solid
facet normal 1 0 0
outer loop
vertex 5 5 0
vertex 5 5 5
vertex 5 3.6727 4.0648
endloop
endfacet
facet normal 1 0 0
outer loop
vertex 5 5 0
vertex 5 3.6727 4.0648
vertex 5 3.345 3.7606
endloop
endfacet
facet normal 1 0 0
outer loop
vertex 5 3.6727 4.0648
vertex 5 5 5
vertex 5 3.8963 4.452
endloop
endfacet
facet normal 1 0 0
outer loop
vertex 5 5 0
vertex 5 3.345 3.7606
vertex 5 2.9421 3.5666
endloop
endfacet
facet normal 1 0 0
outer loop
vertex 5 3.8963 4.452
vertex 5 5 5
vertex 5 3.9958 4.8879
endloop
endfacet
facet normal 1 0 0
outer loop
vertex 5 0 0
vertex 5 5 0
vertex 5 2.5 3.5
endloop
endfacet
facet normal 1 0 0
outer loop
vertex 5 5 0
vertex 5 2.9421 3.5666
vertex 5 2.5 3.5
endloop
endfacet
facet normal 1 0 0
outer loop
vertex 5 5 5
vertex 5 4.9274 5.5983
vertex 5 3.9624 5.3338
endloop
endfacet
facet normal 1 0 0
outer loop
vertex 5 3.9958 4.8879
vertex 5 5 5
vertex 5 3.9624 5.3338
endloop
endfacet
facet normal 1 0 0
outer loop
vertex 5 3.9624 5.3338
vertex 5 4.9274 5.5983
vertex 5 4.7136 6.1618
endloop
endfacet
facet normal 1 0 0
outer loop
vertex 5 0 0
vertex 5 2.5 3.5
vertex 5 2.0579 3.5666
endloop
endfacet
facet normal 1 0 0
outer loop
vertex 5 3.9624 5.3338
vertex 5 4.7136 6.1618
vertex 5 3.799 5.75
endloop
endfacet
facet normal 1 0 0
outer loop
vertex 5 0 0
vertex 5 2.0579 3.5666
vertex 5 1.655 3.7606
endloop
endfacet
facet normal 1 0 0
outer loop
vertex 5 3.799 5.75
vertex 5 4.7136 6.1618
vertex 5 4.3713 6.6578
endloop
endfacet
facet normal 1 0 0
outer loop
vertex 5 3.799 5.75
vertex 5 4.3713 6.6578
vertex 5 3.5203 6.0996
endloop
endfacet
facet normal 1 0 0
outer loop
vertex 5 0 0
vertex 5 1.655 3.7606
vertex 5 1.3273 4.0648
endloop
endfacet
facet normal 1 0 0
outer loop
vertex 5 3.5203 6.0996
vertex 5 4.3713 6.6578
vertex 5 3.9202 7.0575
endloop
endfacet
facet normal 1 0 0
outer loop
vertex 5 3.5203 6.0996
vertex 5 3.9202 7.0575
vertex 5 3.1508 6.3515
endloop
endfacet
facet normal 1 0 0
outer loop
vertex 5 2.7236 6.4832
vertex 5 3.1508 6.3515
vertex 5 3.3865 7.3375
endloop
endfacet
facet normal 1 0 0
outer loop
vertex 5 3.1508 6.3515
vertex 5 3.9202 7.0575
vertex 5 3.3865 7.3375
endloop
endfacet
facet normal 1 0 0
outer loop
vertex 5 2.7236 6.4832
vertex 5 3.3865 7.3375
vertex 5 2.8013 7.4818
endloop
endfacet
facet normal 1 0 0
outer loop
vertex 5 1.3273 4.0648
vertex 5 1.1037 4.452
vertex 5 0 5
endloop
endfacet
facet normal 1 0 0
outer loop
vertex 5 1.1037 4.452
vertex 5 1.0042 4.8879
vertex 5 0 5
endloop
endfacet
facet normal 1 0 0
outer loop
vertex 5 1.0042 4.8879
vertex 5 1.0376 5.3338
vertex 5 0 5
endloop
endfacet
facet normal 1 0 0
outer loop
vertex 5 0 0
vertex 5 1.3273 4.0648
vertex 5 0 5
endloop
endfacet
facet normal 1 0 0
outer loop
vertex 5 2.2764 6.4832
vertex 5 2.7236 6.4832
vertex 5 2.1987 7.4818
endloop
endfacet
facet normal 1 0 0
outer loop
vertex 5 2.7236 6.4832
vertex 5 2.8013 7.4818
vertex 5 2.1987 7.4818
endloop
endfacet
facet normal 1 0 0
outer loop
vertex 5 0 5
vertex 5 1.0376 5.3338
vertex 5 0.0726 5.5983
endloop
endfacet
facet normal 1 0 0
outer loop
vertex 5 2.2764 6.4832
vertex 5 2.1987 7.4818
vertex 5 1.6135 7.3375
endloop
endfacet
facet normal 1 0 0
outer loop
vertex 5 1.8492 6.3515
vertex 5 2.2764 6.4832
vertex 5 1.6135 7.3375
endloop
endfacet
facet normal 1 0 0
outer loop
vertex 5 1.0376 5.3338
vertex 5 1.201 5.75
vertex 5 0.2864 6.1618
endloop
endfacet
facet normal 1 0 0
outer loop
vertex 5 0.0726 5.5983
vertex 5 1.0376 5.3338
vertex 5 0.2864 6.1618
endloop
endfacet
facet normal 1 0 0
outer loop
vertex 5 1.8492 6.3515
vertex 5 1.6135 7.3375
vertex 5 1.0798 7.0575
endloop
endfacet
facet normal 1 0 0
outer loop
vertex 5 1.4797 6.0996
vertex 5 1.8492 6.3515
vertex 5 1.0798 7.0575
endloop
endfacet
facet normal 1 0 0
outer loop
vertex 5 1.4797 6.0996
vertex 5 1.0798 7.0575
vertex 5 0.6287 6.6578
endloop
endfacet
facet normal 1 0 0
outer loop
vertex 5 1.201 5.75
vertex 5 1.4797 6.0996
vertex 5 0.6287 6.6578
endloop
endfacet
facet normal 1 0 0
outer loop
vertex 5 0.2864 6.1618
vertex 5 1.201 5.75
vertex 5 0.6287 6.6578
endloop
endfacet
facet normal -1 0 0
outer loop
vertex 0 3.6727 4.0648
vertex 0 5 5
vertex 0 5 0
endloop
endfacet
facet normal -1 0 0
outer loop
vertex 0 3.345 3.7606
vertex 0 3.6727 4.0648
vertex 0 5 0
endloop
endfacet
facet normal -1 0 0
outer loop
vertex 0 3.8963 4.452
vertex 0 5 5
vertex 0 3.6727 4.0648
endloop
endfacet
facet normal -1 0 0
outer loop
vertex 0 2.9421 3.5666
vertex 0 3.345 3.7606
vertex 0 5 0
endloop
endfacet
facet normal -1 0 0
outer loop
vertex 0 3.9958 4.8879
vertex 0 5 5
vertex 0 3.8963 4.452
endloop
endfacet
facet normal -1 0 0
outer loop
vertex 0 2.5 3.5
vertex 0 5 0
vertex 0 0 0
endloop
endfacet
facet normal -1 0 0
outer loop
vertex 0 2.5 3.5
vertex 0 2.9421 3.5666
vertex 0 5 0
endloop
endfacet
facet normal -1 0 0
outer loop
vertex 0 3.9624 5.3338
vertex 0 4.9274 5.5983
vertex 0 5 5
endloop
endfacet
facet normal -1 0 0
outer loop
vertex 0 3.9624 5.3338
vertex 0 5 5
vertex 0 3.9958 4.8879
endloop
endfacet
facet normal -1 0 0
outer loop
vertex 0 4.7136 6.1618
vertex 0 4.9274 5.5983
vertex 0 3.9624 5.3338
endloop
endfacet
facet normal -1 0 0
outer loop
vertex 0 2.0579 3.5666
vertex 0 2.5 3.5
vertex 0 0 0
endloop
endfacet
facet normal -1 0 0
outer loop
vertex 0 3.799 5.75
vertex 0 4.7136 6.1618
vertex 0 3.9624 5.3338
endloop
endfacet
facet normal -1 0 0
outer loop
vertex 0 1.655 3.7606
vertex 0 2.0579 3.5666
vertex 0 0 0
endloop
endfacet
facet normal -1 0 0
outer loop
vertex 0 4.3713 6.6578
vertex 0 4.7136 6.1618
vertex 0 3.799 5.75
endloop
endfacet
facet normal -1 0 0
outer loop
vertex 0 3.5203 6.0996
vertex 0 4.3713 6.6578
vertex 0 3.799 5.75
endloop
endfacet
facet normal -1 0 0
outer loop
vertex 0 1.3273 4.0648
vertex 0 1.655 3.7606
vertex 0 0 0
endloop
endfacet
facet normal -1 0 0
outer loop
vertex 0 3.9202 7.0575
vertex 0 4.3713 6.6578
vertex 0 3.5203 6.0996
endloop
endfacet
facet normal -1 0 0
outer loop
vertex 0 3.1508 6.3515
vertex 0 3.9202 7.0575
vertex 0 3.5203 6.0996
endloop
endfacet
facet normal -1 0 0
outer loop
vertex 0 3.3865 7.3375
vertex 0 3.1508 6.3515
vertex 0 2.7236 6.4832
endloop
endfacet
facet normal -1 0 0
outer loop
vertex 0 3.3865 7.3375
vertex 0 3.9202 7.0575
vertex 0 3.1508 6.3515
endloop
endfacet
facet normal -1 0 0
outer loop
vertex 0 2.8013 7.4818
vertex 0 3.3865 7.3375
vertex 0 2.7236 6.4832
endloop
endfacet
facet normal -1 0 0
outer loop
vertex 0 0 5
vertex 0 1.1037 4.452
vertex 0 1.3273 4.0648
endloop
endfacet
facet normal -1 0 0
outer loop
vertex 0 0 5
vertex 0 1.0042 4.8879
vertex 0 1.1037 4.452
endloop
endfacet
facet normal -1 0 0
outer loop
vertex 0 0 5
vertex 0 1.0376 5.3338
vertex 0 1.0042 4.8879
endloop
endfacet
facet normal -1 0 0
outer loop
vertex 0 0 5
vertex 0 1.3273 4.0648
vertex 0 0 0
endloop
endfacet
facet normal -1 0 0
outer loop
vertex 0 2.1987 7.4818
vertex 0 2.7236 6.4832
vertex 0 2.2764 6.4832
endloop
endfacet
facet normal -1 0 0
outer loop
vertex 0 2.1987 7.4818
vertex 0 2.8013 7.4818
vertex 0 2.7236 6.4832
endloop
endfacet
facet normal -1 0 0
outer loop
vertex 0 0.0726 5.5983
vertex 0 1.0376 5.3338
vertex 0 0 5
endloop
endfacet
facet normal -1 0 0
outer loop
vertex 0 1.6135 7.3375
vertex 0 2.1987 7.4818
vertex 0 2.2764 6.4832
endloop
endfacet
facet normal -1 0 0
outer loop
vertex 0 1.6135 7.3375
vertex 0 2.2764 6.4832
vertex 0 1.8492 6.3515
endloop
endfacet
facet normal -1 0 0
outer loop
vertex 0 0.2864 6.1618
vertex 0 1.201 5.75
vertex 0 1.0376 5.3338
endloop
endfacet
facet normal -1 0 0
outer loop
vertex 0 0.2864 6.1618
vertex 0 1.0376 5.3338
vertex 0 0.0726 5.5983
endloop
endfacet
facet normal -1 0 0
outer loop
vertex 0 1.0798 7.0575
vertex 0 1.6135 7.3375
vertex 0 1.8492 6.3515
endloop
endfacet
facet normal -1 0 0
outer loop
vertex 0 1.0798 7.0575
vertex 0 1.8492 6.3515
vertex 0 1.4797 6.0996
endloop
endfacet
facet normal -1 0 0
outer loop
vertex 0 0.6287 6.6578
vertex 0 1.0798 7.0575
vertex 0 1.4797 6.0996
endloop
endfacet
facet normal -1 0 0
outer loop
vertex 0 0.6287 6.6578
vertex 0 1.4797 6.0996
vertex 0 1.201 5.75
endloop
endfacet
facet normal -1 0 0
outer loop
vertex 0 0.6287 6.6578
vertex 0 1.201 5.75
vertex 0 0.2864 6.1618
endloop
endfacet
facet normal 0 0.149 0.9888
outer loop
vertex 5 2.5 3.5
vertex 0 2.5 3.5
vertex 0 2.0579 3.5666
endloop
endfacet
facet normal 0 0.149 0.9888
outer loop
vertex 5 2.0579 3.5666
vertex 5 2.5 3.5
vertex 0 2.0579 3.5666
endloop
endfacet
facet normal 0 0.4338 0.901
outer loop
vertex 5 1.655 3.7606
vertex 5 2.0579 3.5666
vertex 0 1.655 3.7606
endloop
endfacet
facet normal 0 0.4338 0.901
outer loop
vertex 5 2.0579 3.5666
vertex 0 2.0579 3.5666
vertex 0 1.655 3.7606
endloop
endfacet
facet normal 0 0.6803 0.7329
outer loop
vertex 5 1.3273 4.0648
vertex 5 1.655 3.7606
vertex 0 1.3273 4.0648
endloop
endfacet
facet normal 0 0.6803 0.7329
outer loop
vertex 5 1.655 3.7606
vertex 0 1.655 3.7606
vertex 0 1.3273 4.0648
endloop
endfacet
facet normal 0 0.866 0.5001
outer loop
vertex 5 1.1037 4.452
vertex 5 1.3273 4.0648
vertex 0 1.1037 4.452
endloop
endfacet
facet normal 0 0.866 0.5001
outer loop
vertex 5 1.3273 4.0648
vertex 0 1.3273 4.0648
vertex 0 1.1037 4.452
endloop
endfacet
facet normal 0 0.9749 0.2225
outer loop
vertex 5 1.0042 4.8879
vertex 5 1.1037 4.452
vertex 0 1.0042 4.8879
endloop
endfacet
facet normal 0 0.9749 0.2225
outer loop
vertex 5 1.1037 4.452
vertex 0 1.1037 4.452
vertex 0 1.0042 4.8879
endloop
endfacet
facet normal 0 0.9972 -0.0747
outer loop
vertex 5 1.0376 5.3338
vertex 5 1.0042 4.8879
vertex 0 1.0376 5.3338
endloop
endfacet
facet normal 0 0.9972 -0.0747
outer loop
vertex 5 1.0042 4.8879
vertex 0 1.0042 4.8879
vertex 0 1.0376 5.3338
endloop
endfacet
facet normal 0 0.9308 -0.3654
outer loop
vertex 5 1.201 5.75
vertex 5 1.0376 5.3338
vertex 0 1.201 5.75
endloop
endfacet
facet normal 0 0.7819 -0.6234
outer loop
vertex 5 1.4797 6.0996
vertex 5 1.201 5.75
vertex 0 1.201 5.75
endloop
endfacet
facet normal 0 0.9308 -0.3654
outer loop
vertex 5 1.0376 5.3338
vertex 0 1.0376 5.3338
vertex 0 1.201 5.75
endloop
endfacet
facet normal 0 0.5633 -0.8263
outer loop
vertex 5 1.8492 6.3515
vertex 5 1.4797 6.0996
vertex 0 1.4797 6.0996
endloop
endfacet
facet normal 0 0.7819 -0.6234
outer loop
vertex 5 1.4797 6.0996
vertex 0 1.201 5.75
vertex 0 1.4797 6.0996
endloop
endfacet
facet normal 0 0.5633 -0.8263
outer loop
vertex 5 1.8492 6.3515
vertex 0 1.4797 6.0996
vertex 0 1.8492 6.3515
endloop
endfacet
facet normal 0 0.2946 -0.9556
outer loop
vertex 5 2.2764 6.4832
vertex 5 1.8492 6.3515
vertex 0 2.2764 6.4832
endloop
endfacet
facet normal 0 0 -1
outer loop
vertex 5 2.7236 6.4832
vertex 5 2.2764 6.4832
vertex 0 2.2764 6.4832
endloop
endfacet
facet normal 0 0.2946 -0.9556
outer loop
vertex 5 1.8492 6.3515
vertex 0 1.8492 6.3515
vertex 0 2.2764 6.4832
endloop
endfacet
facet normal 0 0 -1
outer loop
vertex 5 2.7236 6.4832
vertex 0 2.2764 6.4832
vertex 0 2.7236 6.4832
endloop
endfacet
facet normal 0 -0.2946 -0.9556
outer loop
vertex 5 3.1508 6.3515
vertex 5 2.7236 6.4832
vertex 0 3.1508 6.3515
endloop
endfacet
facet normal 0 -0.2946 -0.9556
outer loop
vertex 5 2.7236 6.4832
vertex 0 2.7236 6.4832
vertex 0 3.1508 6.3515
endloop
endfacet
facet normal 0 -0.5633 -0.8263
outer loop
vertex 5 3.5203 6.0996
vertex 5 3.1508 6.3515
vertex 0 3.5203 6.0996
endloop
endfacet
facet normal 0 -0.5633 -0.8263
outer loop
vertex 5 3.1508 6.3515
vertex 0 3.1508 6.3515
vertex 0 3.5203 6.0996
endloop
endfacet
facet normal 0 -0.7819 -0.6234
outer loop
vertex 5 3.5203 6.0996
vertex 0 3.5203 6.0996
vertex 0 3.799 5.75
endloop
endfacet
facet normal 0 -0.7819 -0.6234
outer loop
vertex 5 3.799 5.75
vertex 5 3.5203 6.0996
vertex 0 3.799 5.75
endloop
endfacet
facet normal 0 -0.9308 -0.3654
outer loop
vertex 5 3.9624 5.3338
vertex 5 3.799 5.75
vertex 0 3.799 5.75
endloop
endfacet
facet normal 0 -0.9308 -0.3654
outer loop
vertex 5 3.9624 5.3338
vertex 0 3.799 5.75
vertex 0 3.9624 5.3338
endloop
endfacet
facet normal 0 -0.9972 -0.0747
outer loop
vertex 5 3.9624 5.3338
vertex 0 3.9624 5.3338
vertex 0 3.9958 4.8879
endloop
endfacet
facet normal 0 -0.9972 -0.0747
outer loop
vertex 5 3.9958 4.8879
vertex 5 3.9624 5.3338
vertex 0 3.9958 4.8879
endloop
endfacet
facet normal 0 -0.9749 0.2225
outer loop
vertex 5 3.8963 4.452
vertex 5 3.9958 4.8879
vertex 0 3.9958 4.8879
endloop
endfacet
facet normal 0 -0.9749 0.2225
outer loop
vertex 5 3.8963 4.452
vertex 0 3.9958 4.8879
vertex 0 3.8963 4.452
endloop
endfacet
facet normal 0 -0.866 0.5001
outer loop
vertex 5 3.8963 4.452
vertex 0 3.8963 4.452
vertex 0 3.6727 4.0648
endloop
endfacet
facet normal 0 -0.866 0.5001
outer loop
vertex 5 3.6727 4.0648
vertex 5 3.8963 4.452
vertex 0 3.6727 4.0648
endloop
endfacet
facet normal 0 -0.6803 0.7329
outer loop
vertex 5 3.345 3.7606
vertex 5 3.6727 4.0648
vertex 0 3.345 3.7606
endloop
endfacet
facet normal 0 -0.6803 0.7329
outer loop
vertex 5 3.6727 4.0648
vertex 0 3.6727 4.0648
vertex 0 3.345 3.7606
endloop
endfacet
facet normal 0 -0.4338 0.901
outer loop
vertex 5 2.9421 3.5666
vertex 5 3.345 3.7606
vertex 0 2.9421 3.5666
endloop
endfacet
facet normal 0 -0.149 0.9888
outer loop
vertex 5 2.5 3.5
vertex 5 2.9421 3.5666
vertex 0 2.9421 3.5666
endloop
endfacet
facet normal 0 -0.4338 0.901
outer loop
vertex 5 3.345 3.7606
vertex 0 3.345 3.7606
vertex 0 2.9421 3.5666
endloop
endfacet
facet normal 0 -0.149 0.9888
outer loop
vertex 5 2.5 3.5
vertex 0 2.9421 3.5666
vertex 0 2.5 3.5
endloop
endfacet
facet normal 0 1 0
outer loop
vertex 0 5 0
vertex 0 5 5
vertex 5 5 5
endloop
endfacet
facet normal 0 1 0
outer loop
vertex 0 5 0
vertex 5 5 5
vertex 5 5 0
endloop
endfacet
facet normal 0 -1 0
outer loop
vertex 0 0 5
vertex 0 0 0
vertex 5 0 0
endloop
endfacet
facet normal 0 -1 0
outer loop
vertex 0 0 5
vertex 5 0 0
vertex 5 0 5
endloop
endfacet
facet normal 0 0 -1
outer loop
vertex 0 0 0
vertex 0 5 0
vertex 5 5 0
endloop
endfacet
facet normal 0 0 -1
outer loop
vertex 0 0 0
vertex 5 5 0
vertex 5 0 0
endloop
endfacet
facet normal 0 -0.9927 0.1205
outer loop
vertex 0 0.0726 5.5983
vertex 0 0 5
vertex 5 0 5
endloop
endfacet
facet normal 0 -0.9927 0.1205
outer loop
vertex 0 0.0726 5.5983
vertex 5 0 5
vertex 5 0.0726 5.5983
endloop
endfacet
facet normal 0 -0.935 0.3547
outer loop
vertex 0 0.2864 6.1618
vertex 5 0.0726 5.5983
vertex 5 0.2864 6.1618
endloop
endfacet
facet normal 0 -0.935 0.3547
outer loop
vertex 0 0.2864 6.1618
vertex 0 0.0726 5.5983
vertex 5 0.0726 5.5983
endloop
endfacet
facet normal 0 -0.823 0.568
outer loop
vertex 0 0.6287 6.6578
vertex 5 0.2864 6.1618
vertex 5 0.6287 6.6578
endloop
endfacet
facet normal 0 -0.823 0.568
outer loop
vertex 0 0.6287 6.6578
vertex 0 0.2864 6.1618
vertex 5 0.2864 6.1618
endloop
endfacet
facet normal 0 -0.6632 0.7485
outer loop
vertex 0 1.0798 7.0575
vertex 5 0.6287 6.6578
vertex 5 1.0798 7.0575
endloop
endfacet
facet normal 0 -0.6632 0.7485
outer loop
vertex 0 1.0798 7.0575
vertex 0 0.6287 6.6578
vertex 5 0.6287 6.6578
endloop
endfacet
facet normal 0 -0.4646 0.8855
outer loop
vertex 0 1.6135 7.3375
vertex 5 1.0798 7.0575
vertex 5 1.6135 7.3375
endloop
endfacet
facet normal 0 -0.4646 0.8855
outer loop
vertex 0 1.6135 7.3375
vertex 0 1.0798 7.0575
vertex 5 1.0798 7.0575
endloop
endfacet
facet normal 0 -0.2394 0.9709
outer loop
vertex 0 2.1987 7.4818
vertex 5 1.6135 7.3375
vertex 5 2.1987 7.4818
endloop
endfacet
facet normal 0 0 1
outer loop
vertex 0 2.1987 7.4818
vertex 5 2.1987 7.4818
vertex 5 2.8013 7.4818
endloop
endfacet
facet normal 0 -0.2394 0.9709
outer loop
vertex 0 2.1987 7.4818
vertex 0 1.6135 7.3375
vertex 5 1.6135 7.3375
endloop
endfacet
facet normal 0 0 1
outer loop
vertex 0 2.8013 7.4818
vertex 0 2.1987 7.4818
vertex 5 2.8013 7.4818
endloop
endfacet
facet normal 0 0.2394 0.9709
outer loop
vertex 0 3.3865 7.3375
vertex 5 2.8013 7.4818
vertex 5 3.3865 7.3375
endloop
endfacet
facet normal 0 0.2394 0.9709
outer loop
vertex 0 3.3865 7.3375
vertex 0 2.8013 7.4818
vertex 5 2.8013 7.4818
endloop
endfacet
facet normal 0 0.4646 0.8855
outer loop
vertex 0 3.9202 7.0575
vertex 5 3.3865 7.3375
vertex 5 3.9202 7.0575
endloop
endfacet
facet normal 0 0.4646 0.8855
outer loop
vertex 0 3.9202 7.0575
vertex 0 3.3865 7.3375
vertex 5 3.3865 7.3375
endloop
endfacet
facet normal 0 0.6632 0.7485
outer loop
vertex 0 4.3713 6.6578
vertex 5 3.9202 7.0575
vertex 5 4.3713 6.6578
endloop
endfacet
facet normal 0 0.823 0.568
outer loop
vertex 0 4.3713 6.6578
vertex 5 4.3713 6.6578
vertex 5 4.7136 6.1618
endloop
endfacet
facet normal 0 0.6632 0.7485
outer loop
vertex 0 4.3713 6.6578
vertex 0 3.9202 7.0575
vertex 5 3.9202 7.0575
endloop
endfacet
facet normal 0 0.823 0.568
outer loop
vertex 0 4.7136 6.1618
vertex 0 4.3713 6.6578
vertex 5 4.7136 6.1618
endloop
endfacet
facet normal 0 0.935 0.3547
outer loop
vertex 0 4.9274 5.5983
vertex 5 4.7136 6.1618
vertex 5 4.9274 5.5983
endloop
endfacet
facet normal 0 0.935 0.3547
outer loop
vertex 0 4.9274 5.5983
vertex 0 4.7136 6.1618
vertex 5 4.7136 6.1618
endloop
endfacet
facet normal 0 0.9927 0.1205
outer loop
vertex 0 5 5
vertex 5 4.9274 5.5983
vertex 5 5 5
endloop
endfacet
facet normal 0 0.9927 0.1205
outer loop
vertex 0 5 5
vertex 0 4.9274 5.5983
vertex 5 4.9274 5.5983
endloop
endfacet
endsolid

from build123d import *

# Parameters (mm, degrees)
ESQUISSE1_R        = 1.5
BOSS_EXTRU_1_DEPTH = 5


with BuildPart() as part:
    # Esquisse1 → Boss.-Extru.1 (new body)
    with BuildSketch(Plane(origin=(0, 0, 0), x_dir=(0, -1, 0), z_dir=(-1, 0, 0))):
        with BuildLine():
            Line((-5, 5), (-5, 0))
            Line((-5, 0), (0, 0))
            Line((0, 0), (0, 5))
            ThreePointArc((0, 5), (-2.5, 7.5), (-5, 5))
        make_face()
        with Locations(Location((-2.5, 5, 0), (0, 0, 270))):  # turned: the seam where the file's is
            Circle(ESQUISSE1_R, mode=Mode.SUBTRACT)
    extrude(amount=-BOSS_EXTRU_1_DEPTH)


solid = part.part
